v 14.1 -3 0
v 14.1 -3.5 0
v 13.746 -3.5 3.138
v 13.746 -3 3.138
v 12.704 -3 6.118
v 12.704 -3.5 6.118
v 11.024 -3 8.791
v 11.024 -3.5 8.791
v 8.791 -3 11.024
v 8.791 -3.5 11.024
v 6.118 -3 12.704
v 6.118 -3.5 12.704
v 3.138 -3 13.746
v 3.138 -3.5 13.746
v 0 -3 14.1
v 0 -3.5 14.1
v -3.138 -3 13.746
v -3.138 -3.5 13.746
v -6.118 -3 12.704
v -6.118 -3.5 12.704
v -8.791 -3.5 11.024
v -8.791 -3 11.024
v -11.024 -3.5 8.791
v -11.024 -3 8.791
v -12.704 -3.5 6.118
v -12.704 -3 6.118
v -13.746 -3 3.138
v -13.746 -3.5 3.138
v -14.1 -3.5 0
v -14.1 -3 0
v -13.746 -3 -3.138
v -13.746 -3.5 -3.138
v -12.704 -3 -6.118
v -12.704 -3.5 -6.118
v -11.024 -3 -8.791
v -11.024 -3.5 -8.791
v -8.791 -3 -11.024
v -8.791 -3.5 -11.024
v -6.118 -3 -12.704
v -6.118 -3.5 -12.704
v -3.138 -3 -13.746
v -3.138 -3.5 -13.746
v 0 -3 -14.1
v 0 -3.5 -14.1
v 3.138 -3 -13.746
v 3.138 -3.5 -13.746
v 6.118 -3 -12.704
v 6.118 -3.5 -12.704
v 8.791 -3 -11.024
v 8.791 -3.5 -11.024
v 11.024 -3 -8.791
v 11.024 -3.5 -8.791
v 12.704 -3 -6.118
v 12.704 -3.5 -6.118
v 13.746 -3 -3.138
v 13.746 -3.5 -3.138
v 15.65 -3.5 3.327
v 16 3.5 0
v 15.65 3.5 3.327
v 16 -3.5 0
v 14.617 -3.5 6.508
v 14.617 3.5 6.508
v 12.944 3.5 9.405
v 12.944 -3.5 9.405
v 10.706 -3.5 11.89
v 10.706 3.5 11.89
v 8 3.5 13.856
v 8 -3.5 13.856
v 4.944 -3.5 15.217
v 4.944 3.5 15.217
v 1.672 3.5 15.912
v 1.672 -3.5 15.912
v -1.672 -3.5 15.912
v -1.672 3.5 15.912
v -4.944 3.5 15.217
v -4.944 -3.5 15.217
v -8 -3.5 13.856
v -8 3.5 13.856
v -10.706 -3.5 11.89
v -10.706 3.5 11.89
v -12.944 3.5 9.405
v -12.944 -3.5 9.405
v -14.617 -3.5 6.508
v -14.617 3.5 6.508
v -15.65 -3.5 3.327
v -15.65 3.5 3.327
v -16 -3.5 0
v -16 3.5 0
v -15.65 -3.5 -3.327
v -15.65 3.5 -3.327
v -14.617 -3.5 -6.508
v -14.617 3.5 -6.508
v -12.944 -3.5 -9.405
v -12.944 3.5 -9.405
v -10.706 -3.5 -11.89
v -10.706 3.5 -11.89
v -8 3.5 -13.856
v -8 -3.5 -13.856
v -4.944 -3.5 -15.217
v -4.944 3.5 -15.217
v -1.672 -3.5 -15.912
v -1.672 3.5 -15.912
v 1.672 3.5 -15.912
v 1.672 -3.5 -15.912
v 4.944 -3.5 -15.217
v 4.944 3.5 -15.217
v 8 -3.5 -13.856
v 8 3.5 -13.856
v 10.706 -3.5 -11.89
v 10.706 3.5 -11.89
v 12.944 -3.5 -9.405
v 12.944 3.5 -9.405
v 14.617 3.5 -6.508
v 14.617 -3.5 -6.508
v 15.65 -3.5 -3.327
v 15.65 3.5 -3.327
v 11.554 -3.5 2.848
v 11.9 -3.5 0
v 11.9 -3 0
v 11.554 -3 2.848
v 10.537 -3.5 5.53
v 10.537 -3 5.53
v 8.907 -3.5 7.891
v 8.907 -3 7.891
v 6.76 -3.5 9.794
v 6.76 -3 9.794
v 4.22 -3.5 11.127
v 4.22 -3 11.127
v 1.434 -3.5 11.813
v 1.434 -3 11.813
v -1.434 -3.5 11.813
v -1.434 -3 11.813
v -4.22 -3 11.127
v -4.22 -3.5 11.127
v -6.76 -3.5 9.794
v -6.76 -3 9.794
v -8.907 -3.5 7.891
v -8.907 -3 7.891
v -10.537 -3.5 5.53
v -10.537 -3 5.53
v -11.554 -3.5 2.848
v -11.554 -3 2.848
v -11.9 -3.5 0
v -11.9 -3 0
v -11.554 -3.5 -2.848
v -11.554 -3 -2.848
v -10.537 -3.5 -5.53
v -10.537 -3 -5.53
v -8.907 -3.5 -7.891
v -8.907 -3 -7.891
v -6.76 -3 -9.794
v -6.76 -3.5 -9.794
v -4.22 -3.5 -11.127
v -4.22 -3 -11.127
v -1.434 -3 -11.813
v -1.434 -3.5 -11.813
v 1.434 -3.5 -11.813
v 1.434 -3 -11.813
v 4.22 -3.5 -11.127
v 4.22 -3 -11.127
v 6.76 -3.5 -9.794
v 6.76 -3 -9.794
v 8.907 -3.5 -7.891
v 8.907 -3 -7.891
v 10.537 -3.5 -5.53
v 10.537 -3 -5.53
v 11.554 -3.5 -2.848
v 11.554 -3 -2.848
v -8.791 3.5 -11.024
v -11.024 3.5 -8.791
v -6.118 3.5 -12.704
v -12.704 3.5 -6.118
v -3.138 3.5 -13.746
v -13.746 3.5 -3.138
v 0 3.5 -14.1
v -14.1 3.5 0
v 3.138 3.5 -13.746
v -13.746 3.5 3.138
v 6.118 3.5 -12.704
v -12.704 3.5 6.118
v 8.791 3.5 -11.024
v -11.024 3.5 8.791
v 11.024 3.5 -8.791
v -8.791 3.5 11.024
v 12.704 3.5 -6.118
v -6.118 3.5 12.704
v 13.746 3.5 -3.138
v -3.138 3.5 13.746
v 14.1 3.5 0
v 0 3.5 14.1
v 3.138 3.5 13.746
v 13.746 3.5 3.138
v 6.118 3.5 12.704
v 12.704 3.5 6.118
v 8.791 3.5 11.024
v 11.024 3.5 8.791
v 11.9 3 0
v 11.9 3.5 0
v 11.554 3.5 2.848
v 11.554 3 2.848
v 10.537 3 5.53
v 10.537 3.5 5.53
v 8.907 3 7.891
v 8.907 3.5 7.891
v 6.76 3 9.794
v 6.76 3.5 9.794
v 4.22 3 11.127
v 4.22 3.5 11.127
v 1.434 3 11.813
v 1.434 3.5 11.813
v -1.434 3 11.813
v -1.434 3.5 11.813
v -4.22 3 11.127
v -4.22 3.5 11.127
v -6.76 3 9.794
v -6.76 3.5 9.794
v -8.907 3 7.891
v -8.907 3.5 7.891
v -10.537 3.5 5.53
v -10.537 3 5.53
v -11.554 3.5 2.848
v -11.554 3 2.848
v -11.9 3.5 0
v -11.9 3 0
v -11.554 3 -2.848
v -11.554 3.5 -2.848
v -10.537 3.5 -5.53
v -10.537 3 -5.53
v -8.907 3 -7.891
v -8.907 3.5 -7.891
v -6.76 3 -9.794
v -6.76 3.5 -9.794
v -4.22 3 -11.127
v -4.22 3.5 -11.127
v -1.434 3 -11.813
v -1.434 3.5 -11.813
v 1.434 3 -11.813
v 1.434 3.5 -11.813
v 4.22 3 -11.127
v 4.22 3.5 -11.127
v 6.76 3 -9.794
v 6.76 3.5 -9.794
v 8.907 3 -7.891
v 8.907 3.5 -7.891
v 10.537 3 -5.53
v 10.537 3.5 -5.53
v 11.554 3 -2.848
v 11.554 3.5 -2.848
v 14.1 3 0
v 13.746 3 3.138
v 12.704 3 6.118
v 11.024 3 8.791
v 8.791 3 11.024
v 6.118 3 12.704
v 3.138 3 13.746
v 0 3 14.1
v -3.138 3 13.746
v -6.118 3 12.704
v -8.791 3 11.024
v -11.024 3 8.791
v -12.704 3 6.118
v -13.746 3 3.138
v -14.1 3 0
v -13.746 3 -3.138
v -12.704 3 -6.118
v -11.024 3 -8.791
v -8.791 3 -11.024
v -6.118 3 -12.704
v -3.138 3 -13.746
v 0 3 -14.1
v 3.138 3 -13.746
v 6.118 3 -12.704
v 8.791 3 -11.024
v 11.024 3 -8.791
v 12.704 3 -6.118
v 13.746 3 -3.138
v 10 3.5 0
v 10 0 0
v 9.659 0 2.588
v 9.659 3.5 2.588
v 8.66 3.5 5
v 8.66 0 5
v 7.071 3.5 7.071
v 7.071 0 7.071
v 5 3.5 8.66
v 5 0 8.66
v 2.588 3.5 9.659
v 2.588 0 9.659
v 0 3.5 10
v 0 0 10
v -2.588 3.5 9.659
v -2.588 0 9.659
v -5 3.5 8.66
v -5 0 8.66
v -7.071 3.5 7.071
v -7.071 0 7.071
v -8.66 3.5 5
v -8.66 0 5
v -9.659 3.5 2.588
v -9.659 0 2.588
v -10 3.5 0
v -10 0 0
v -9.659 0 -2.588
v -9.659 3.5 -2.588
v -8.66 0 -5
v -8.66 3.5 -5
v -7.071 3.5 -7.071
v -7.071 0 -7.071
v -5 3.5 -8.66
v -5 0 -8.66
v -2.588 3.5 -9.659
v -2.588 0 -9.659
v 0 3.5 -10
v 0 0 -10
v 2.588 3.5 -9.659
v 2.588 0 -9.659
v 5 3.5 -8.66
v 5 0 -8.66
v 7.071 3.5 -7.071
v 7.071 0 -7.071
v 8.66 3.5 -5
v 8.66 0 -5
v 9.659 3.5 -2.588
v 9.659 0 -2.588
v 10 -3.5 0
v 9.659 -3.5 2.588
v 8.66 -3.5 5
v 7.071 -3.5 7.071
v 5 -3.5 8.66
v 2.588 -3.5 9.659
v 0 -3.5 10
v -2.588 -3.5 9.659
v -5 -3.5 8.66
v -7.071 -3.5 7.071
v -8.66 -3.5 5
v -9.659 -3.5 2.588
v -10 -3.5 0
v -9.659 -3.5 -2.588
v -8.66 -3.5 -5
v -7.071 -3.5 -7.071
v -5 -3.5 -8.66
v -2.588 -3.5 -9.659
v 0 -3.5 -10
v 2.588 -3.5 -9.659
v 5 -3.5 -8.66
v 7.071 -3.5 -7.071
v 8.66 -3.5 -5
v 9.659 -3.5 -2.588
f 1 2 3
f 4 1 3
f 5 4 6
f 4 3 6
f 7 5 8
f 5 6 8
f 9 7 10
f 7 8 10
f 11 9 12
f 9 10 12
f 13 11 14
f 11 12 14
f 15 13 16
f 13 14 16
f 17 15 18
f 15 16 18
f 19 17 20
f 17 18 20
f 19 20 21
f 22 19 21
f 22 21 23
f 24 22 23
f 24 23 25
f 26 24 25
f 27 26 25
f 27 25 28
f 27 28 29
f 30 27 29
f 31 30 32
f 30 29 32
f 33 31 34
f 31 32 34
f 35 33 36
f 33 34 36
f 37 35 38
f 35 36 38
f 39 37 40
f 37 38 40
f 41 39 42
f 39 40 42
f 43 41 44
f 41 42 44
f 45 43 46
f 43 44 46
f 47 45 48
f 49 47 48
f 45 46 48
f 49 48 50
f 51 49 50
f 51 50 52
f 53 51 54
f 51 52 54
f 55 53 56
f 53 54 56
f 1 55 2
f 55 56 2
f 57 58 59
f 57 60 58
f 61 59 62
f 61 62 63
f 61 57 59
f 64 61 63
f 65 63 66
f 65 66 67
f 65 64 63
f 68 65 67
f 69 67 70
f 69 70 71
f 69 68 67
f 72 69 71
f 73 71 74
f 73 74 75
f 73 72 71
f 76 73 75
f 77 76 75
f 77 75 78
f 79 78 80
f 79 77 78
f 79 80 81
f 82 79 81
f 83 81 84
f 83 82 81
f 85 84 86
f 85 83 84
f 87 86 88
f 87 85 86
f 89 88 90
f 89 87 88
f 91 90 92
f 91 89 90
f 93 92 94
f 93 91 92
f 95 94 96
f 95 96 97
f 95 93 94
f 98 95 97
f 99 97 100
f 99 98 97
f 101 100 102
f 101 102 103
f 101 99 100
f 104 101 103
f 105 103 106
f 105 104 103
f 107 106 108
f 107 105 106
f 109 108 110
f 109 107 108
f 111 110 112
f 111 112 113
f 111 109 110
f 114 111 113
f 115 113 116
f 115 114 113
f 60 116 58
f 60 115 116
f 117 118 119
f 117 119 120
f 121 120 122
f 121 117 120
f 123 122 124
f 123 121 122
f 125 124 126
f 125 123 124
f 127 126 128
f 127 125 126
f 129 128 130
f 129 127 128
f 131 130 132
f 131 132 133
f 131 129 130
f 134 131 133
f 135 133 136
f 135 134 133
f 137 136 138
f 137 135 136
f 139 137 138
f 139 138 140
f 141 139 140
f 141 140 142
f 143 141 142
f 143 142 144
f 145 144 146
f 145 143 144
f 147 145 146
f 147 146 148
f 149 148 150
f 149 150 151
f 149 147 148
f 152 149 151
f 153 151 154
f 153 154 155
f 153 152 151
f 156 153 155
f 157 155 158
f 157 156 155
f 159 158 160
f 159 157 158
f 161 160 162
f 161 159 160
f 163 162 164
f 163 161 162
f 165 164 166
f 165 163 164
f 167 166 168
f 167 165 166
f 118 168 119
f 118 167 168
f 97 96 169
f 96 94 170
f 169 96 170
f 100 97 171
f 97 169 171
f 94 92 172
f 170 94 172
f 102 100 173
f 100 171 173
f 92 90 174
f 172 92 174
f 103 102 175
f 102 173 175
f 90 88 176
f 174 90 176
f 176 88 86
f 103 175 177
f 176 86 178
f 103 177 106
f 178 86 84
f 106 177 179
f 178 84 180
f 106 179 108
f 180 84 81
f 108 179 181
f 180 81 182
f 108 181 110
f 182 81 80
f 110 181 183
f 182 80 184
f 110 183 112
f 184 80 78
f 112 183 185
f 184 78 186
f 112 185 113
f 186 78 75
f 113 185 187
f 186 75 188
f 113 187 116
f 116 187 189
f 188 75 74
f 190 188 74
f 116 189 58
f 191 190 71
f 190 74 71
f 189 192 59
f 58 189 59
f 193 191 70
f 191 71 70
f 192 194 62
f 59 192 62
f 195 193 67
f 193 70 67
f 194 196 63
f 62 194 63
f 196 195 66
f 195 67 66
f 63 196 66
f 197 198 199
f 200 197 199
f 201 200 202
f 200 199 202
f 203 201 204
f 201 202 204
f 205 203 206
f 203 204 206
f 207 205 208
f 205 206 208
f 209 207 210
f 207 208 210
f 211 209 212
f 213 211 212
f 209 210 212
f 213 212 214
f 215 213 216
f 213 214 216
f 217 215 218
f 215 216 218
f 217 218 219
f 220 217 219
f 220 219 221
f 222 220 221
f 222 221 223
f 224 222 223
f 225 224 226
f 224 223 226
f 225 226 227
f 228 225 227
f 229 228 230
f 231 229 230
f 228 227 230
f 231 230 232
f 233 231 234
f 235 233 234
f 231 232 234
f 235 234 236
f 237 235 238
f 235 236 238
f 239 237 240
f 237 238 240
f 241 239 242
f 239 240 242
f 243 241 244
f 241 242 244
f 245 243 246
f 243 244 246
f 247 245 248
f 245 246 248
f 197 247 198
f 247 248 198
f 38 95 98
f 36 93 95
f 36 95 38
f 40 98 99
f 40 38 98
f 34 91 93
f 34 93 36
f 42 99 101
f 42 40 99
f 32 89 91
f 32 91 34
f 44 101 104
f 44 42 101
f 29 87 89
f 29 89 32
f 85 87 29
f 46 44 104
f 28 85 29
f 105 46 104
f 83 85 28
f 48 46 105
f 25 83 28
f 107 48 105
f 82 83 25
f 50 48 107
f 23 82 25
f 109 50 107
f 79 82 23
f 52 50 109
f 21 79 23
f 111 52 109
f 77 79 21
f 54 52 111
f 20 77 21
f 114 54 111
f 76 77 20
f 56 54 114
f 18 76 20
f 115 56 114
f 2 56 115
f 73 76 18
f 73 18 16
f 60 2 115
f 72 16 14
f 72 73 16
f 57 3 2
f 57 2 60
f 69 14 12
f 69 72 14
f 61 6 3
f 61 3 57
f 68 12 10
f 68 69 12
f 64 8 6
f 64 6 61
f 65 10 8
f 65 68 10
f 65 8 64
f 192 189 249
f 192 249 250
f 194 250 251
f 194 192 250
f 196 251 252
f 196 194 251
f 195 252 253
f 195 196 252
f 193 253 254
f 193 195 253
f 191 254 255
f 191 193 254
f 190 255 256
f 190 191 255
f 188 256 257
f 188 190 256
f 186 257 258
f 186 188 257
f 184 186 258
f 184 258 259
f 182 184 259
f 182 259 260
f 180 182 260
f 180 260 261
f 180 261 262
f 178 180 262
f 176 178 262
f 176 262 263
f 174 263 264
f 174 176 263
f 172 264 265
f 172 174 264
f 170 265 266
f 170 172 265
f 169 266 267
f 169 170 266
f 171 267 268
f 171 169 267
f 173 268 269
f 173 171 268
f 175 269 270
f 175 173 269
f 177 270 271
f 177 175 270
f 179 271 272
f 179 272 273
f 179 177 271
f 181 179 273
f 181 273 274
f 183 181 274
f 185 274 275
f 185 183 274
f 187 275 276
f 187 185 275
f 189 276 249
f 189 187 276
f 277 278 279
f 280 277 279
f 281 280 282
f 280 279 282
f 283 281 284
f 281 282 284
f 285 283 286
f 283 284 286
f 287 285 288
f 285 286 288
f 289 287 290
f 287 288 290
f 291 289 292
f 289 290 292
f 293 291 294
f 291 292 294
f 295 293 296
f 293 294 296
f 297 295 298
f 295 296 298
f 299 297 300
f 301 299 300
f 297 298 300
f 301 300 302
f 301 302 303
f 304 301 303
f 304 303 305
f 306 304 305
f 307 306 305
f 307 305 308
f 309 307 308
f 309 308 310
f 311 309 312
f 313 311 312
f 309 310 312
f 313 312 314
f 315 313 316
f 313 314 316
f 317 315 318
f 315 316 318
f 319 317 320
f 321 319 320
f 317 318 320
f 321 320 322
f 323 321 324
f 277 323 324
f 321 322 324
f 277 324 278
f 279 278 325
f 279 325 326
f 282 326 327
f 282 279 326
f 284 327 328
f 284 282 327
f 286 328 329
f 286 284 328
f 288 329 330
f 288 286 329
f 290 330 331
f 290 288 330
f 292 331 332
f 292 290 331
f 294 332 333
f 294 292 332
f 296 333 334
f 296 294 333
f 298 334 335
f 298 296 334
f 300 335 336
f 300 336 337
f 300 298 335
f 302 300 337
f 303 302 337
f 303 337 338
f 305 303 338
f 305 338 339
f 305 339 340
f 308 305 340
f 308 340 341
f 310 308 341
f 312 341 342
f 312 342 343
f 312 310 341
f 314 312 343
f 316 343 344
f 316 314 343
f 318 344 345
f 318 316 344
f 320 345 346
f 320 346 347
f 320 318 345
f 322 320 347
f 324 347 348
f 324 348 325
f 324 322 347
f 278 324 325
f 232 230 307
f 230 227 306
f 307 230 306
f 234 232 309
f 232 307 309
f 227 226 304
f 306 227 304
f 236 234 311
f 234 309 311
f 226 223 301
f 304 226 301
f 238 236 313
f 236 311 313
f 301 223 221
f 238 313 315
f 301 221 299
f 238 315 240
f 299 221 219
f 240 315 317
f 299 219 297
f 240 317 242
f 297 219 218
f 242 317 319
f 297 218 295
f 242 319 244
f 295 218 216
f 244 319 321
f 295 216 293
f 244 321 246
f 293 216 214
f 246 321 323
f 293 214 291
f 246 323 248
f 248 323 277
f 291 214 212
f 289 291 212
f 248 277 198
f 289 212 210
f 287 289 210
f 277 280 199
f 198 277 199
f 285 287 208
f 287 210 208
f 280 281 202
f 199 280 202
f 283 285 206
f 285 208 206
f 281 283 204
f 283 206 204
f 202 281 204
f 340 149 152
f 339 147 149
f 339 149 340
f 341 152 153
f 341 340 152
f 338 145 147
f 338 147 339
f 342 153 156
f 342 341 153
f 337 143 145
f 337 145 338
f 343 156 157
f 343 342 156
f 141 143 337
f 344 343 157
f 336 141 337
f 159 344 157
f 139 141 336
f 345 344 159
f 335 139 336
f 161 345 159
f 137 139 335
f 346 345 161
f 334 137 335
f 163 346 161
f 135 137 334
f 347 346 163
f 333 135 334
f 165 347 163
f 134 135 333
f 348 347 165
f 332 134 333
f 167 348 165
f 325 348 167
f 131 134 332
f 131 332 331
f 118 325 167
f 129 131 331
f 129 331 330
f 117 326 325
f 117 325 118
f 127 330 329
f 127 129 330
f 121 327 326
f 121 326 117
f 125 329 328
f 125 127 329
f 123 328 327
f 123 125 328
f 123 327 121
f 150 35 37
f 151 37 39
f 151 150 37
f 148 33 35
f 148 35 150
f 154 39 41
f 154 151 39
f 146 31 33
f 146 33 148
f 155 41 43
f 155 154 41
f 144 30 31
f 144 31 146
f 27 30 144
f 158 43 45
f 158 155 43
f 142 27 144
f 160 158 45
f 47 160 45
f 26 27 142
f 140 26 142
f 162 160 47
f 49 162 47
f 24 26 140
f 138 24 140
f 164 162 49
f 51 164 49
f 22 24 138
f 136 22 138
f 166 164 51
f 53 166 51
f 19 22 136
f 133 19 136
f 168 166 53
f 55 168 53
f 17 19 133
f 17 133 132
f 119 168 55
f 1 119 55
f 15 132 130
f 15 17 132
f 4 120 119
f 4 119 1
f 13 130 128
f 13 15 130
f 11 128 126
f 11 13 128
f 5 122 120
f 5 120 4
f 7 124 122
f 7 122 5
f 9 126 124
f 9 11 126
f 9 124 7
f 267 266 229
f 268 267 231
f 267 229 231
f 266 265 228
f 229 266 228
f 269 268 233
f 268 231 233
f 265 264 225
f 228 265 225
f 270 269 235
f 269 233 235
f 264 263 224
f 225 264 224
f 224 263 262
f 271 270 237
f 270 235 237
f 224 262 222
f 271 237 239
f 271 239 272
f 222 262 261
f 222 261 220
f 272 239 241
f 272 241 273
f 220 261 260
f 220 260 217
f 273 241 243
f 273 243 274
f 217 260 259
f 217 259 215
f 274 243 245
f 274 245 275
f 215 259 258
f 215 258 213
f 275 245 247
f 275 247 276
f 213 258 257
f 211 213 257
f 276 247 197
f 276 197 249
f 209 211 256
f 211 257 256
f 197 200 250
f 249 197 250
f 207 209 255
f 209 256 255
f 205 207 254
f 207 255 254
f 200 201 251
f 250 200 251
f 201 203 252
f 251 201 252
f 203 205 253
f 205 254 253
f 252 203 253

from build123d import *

# Parameters (mm, degrees)
F0_R          = 16
F0_R_2        = 10
F1_DEPTH      = 3.5
F1_DEPTH_BACK = 3.5
F2_R          = 14.1
F2_R_2        = 11.9
F3_DEPTH      = 0.5


# Not quite as in the source:
# - a pattern or mirror of a feature is missing from the dataset's text; its kind, count and spacing are read off the source's solid


with BuildPart() as f1:
    # F0 (on Front) → F1 (new body, two sides)
    with BuildSketch(Plane.XZ) as f1_sk:
        Circle(F0_R)
        Circle(F0_R_2, mode=Mode.SUBTRACT)
    extrude(amount=F1_DEPTH)
    extrude(f1_sk.sketch, amount=-F1_DEPTH_BACK)

    # F2 (on face) → F3 (cut)
    with BuildSketch(Plane.XZ.offset(3.5)):
        Circle(F2_R)
        Circle(F2_R_2, mode=Mode.SUBTRACT)
    f3 = extrude(amount=-F3_DEPTH, mode=Mode.SUBTRACT)

    # F3_copies: F3 across plane
    add(f3.mirror(Plane.ZX), mode=Mode.SUBTRACT)


solid = f1.part
